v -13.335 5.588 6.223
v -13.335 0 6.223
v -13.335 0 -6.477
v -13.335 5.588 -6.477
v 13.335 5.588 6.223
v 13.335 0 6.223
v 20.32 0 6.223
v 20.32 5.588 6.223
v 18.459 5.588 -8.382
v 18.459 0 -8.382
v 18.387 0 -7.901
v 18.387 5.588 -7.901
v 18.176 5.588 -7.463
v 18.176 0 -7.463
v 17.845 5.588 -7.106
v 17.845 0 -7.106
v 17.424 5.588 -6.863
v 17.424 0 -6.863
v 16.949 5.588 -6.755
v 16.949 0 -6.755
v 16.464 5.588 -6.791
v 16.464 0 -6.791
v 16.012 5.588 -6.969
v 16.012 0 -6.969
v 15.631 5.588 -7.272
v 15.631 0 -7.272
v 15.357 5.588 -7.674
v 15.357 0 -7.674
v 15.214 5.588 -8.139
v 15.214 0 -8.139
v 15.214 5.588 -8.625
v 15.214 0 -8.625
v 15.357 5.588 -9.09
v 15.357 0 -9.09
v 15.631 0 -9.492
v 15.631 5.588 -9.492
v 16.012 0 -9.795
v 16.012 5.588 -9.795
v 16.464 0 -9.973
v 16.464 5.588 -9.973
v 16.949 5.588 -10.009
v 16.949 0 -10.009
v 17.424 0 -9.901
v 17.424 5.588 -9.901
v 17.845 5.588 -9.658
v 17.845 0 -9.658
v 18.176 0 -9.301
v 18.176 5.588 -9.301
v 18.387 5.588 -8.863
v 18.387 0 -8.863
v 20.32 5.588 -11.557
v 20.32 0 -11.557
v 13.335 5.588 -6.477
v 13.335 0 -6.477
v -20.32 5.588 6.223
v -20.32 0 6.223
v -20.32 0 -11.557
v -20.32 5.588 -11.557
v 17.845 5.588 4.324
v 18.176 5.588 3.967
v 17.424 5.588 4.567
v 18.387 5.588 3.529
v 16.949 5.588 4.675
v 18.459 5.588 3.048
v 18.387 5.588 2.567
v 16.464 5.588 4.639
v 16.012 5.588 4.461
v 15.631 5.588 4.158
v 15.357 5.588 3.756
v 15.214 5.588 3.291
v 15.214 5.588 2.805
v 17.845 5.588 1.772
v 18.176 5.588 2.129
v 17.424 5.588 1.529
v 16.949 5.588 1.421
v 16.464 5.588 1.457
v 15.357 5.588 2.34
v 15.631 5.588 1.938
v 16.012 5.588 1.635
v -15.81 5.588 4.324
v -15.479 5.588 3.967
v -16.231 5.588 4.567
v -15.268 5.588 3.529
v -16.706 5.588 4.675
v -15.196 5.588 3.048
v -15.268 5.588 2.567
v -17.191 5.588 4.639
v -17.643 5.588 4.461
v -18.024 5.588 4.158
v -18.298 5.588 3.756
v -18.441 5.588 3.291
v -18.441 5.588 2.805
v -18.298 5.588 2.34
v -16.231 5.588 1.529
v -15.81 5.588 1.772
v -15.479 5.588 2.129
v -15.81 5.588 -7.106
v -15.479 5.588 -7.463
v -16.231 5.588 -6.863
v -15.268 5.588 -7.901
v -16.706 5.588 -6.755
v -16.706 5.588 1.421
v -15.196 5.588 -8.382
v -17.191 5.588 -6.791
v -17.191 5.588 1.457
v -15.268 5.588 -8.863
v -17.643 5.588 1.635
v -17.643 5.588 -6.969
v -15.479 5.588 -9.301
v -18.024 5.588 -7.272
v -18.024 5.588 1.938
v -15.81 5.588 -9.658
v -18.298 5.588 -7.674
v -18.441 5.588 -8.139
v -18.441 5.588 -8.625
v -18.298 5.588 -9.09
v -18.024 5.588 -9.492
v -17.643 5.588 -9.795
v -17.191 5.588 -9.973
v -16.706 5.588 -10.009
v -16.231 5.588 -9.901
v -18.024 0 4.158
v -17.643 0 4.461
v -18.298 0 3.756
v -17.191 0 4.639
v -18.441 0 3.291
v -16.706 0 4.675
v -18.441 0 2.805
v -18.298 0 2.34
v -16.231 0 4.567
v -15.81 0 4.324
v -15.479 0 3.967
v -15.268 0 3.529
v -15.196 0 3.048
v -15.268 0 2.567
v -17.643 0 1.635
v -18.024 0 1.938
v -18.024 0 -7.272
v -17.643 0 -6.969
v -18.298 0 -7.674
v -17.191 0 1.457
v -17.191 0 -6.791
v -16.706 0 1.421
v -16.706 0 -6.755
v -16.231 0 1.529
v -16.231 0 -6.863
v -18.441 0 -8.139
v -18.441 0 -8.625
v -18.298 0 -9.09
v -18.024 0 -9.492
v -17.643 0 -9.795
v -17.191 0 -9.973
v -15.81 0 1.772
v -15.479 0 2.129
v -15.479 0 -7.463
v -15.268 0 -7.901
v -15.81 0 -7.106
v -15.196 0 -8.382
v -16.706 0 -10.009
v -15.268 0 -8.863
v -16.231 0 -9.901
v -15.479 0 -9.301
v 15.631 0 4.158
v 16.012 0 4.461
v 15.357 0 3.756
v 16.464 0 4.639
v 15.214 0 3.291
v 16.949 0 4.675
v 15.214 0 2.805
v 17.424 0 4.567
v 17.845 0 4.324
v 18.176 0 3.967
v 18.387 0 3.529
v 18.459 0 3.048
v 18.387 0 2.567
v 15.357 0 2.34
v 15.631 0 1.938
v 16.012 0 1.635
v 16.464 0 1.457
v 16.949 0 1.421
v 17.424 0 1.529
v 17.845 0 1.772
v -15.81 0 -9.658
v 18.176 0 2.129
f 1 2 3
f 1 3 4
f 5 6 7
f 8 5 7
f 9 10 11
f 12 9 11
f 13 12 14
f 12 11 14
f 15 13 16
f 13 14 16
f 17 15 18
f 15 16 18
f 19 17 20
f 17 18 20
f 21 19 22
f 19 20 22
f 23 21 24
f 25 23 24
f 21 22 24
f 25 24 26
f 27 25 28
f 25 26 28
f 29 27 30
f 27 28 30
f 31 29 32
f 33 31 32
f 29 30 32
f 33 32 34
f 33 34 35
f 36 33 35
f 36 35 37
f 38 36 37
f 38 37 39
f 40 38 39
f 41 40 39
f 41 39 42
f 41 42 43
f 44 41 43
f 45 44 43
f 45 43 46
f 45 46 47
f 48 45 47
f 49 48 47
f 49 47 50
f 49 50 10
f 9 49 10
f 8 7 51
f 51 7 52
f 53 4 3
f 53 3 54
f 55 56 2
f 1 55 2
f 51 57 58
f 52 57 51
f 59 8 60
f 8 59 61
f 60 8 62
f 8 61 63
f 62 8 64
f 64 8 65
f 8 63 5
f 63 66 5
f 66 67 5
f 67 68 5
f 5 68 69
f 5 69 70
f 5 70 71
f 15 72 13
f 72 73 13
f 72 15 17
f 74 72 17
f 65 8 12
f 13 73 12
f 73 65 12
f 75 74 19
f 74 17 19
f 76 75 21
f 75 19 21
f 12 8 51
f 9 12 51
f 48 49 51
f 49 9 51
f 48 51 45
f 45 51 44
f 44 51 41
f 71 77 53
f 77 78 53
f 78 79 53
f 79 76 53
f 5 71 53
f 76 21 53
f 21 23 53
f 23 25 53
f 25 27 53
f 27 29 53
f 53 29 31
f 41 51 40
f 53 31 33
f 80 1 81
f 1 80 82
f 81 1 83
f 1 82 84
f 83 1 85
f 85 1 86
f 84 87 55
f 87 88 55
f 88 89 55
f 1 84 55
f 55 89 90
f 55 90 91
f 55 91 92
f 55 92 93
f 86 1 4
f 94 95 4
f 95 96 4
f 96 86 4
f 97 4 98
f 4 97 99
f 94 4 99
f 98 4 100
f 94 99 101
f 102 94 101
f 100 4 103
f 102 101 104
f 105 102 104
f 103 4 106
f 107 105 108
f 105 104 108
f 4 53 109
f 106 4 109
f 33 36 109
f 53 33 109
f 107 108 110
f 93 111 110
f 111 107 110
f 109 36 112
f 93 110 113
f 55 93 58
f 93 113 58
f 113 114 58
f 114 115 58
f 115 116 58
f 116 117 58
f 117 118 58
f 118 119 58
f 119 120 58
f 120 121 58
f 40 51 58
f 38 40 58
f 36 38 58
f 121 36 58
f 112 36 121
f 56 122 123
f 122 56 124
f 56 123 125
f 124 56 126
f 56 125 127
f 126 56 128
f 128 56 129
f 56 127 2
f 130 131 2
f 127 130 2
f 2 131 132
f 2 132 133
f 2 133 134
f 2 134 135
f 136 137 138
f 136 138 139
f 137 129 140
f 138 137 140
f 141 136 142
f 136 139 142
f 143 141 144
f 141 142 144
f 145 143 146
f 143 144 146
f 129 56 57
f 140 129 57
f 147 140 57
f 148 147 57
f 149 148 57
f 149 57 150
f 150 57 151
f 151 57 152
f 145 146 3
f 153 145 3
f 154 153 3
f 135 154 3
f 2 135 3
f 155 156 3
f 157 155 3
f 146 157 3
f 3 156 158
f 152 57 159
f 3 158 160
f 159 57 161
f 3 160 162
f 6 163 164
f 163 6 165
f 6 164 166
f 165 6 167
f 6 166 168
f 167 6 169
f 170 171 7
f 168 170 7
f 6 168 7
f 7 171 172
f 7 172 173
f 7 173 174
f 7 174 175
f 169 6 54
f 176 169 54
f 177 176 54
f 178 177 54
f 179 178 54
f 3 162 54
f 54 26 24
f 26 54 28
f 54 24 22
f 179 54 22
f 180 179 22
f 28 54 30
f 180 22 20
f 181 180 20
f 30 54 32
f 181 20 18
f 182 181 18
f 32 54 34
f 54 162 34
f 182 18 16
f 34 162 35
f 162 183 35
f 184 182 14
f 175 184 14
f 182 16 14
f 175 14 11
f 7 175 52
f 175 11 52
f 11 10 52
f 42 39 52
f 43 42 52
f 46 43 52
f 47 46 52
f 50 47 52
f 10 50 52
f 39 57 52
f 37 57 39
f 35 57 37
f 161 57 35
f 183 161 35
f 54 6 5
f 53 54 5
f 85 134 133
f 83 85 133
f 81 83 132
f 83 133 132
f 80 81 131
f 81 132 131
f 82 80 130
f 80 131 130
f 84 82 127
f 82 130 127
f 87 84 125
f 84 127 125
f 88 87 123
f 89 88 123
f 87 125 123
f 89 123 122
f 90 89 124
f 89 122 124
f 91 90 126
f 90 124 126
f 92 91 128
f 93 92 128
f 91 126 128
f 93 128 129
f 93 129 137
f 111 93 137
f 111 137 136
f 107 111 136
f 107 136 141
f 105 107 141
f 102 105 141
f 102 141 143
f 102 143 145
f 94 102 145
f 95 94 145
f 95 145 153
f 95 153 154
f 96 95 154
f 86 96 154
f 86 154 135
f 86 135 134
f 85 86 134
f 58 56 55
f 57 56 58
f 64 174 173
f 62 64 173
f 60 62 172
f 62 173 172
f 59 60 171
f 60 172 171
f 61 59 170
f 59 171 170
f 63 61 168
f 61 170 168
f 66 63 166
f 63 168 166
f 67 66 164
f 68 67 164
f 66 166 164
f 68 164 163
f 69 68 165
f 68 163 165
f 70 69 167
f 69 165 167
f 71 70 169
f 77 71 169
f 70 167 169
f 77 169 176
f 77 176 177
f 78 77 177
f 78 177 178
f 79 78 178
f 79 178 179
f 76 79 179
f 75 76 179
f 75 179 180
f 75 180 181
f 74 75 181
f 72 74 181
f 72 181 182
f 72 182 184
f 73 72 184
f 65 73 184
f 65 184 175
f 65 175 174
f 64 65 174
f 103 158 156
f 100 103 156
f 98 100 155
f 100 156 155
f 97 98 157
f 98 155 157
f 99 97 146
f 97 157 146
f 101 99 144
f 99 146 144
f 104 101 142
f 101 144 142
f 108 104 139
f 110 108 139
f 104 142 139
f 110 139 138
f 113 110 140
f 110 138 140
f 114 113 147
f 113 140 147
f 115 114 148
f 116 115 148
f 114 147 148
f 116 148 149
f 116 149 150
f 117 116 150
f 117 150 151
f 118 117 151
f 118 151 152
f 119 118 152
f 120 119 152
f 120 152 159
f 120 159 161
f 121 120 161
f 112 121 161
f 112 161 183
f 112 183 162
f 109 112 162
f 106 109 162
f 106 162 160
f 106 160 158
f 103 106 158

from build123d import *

# Parameters (mm, degrees)
SKETCH1_W                       = 40.64
SKETCH1_H                       = 17.78
BOSS_EXTRUDE1_DEPTH             = 29.972
SKETCH2_W                       = 26.67
SKETCH2_H                       = 29.972
CUT_EXTRUDE1_DEPTH              = 12.7
SKETCH5_R                       = 8.001
CUT_EXTRUDE4_DEPTH              = 41.340446006
SKETCH6_R                       = 1.1303
CUT_EXTRUDE5_DEPTH              = 52.802457789
SKETCH7_W                       = 19.900329636
SKETCH7_H                       = 4.576555205
BOSS_EXTRUDE2_DEPTH             = 5.08
F_5_32_0_15625_DIAMETER_HOLE1_D = 3.96875
F_30_0_1285_DIAMETER_HOLE1_D    = 3.2639
SKETCH14_W                      = 1.1303
SKETCH14_H                      = 29.972
SKETCH16_W                      = 40.64
SKETCH16_H                      = 26.629644064
CUT_EXTRUDE6_DEPTH              = 41.347520619


with BuildPart() as part:
    # Sketch1 → Boss-Extrude1 (new body)
    with BuildSketch(Plane(origin=(0, 0, 0), x_dir=(1, 0, 0), z_dir=(0, 1, 0))):
        with Locations((0, 2.667)):
            Rectangle(SKETCH1_W, SKETCH1_H)
    extrude(amount=BOSS_EXTRUDE1_DEPTH)

    # Sketch2 → Cut-Extrude1 (cut)
    with BuildSketch(Plane.XY.offset(6.223)):
        with Locations((0, 14.986)):
            Rectangle(SKETCH2_W, SKETCH2_H)
    extrude(amount=-CUT_EXTRUDE1_DEPTH, mode=Mode.SUBTRACT)

    # Sketch5 → Cut-Extrude4 (cut, through all)
    with BuildSketch(Plane(origin=(0, 0, -11.557), x_dir=(-1, 0, 0), z_dir=(0, 0, -1))):
        with Locations((0, 15.875)):
            Circle(SKETCH5_R)
    extrude(amount=-CUT_EXTRUDE4_DEPTH, mode=Mode.SUBTRACT)

    # Sketch6 → Cut-Extrude5 (cut, through all)
    with BuildSketch(Plane.ZY.offset(20.32)):
        with Locations((-2.667, 15.24)):
            Circle(SKETCH6_R)
    extrude(amount=-CUT_EXTRUDE5_DEPTH, mode=Mode.SUBTRACT)

    # Sketch7 → Boss-Extrude2 (add)
    with BuildSketch(Plane.XY.offset(-6.477)):
        with Locations((0, 27.693243708)):
            Rectangle(SKETCH7_W, SKETCH7_H)
    extrude(amount=BOSS_EXTRUDE2_DEPTH)

    # 5/32 (0.15625) Diameter Hole1 (through all)
    with Locations(Plane(origin=(0, 0, -11.557), x_dir=(-1, 0, 0), z_dir=(0, 0, -1))):
        with Locations((-10.16, 21.717), (-10.16, 10.033), (10.16, 21.717), (10.16, 10.033)):
            Hole(F_5_32_0_15625_DIAMETER_HOLE1_D / 2)

    # #30 (0.1285) Diameter Hole1 (through all)
    with Locations(Plane(origin=(0, 29.972, 0), x_dir=(-1, 0, 0), z_dir=(0, 1, 0))):
        with Locations((16.8275, 3.048), (16.8275, -8.382), (-16.8275, -8.382), (-16.8275, 3.048)):
            Hole(F_30_0_1285_DIAMETER_HOLE1_D / 2)

    # Sketch14 → #4-40 Tapped Hole1 (revolve, cut)
    with BuildSketch(Plane(origin=(0, 29.972, -3.937), x_dir=(0, 0, 1), z_dir=(1, 0, 0))):
        with Locations((0.56515, 14.986)):
            Rectangle(SKETCH14_W, SKETCH14_H)
    revolve(axis=Axis((0, 36.322, -3.937), (0, -1, 0)), mode=Mode.SUBTRACT)

    # Sketch16 → Cut-Extrude6 (cut, through all)
    with BuildSketch(Plane(origin=(0, 0, -11.557), x_dir=(-1, 0, 0), z_dir=(0, 0, -1))):
        with Locations((0, 18.902822032)):
            Rectangle(SKETCH16_W, SKETCH16_H)
    extrude(amount=-CUT_EXTRUDE6_DEPTH, mode=Mode.SUBTRACT)


solid = part.part
